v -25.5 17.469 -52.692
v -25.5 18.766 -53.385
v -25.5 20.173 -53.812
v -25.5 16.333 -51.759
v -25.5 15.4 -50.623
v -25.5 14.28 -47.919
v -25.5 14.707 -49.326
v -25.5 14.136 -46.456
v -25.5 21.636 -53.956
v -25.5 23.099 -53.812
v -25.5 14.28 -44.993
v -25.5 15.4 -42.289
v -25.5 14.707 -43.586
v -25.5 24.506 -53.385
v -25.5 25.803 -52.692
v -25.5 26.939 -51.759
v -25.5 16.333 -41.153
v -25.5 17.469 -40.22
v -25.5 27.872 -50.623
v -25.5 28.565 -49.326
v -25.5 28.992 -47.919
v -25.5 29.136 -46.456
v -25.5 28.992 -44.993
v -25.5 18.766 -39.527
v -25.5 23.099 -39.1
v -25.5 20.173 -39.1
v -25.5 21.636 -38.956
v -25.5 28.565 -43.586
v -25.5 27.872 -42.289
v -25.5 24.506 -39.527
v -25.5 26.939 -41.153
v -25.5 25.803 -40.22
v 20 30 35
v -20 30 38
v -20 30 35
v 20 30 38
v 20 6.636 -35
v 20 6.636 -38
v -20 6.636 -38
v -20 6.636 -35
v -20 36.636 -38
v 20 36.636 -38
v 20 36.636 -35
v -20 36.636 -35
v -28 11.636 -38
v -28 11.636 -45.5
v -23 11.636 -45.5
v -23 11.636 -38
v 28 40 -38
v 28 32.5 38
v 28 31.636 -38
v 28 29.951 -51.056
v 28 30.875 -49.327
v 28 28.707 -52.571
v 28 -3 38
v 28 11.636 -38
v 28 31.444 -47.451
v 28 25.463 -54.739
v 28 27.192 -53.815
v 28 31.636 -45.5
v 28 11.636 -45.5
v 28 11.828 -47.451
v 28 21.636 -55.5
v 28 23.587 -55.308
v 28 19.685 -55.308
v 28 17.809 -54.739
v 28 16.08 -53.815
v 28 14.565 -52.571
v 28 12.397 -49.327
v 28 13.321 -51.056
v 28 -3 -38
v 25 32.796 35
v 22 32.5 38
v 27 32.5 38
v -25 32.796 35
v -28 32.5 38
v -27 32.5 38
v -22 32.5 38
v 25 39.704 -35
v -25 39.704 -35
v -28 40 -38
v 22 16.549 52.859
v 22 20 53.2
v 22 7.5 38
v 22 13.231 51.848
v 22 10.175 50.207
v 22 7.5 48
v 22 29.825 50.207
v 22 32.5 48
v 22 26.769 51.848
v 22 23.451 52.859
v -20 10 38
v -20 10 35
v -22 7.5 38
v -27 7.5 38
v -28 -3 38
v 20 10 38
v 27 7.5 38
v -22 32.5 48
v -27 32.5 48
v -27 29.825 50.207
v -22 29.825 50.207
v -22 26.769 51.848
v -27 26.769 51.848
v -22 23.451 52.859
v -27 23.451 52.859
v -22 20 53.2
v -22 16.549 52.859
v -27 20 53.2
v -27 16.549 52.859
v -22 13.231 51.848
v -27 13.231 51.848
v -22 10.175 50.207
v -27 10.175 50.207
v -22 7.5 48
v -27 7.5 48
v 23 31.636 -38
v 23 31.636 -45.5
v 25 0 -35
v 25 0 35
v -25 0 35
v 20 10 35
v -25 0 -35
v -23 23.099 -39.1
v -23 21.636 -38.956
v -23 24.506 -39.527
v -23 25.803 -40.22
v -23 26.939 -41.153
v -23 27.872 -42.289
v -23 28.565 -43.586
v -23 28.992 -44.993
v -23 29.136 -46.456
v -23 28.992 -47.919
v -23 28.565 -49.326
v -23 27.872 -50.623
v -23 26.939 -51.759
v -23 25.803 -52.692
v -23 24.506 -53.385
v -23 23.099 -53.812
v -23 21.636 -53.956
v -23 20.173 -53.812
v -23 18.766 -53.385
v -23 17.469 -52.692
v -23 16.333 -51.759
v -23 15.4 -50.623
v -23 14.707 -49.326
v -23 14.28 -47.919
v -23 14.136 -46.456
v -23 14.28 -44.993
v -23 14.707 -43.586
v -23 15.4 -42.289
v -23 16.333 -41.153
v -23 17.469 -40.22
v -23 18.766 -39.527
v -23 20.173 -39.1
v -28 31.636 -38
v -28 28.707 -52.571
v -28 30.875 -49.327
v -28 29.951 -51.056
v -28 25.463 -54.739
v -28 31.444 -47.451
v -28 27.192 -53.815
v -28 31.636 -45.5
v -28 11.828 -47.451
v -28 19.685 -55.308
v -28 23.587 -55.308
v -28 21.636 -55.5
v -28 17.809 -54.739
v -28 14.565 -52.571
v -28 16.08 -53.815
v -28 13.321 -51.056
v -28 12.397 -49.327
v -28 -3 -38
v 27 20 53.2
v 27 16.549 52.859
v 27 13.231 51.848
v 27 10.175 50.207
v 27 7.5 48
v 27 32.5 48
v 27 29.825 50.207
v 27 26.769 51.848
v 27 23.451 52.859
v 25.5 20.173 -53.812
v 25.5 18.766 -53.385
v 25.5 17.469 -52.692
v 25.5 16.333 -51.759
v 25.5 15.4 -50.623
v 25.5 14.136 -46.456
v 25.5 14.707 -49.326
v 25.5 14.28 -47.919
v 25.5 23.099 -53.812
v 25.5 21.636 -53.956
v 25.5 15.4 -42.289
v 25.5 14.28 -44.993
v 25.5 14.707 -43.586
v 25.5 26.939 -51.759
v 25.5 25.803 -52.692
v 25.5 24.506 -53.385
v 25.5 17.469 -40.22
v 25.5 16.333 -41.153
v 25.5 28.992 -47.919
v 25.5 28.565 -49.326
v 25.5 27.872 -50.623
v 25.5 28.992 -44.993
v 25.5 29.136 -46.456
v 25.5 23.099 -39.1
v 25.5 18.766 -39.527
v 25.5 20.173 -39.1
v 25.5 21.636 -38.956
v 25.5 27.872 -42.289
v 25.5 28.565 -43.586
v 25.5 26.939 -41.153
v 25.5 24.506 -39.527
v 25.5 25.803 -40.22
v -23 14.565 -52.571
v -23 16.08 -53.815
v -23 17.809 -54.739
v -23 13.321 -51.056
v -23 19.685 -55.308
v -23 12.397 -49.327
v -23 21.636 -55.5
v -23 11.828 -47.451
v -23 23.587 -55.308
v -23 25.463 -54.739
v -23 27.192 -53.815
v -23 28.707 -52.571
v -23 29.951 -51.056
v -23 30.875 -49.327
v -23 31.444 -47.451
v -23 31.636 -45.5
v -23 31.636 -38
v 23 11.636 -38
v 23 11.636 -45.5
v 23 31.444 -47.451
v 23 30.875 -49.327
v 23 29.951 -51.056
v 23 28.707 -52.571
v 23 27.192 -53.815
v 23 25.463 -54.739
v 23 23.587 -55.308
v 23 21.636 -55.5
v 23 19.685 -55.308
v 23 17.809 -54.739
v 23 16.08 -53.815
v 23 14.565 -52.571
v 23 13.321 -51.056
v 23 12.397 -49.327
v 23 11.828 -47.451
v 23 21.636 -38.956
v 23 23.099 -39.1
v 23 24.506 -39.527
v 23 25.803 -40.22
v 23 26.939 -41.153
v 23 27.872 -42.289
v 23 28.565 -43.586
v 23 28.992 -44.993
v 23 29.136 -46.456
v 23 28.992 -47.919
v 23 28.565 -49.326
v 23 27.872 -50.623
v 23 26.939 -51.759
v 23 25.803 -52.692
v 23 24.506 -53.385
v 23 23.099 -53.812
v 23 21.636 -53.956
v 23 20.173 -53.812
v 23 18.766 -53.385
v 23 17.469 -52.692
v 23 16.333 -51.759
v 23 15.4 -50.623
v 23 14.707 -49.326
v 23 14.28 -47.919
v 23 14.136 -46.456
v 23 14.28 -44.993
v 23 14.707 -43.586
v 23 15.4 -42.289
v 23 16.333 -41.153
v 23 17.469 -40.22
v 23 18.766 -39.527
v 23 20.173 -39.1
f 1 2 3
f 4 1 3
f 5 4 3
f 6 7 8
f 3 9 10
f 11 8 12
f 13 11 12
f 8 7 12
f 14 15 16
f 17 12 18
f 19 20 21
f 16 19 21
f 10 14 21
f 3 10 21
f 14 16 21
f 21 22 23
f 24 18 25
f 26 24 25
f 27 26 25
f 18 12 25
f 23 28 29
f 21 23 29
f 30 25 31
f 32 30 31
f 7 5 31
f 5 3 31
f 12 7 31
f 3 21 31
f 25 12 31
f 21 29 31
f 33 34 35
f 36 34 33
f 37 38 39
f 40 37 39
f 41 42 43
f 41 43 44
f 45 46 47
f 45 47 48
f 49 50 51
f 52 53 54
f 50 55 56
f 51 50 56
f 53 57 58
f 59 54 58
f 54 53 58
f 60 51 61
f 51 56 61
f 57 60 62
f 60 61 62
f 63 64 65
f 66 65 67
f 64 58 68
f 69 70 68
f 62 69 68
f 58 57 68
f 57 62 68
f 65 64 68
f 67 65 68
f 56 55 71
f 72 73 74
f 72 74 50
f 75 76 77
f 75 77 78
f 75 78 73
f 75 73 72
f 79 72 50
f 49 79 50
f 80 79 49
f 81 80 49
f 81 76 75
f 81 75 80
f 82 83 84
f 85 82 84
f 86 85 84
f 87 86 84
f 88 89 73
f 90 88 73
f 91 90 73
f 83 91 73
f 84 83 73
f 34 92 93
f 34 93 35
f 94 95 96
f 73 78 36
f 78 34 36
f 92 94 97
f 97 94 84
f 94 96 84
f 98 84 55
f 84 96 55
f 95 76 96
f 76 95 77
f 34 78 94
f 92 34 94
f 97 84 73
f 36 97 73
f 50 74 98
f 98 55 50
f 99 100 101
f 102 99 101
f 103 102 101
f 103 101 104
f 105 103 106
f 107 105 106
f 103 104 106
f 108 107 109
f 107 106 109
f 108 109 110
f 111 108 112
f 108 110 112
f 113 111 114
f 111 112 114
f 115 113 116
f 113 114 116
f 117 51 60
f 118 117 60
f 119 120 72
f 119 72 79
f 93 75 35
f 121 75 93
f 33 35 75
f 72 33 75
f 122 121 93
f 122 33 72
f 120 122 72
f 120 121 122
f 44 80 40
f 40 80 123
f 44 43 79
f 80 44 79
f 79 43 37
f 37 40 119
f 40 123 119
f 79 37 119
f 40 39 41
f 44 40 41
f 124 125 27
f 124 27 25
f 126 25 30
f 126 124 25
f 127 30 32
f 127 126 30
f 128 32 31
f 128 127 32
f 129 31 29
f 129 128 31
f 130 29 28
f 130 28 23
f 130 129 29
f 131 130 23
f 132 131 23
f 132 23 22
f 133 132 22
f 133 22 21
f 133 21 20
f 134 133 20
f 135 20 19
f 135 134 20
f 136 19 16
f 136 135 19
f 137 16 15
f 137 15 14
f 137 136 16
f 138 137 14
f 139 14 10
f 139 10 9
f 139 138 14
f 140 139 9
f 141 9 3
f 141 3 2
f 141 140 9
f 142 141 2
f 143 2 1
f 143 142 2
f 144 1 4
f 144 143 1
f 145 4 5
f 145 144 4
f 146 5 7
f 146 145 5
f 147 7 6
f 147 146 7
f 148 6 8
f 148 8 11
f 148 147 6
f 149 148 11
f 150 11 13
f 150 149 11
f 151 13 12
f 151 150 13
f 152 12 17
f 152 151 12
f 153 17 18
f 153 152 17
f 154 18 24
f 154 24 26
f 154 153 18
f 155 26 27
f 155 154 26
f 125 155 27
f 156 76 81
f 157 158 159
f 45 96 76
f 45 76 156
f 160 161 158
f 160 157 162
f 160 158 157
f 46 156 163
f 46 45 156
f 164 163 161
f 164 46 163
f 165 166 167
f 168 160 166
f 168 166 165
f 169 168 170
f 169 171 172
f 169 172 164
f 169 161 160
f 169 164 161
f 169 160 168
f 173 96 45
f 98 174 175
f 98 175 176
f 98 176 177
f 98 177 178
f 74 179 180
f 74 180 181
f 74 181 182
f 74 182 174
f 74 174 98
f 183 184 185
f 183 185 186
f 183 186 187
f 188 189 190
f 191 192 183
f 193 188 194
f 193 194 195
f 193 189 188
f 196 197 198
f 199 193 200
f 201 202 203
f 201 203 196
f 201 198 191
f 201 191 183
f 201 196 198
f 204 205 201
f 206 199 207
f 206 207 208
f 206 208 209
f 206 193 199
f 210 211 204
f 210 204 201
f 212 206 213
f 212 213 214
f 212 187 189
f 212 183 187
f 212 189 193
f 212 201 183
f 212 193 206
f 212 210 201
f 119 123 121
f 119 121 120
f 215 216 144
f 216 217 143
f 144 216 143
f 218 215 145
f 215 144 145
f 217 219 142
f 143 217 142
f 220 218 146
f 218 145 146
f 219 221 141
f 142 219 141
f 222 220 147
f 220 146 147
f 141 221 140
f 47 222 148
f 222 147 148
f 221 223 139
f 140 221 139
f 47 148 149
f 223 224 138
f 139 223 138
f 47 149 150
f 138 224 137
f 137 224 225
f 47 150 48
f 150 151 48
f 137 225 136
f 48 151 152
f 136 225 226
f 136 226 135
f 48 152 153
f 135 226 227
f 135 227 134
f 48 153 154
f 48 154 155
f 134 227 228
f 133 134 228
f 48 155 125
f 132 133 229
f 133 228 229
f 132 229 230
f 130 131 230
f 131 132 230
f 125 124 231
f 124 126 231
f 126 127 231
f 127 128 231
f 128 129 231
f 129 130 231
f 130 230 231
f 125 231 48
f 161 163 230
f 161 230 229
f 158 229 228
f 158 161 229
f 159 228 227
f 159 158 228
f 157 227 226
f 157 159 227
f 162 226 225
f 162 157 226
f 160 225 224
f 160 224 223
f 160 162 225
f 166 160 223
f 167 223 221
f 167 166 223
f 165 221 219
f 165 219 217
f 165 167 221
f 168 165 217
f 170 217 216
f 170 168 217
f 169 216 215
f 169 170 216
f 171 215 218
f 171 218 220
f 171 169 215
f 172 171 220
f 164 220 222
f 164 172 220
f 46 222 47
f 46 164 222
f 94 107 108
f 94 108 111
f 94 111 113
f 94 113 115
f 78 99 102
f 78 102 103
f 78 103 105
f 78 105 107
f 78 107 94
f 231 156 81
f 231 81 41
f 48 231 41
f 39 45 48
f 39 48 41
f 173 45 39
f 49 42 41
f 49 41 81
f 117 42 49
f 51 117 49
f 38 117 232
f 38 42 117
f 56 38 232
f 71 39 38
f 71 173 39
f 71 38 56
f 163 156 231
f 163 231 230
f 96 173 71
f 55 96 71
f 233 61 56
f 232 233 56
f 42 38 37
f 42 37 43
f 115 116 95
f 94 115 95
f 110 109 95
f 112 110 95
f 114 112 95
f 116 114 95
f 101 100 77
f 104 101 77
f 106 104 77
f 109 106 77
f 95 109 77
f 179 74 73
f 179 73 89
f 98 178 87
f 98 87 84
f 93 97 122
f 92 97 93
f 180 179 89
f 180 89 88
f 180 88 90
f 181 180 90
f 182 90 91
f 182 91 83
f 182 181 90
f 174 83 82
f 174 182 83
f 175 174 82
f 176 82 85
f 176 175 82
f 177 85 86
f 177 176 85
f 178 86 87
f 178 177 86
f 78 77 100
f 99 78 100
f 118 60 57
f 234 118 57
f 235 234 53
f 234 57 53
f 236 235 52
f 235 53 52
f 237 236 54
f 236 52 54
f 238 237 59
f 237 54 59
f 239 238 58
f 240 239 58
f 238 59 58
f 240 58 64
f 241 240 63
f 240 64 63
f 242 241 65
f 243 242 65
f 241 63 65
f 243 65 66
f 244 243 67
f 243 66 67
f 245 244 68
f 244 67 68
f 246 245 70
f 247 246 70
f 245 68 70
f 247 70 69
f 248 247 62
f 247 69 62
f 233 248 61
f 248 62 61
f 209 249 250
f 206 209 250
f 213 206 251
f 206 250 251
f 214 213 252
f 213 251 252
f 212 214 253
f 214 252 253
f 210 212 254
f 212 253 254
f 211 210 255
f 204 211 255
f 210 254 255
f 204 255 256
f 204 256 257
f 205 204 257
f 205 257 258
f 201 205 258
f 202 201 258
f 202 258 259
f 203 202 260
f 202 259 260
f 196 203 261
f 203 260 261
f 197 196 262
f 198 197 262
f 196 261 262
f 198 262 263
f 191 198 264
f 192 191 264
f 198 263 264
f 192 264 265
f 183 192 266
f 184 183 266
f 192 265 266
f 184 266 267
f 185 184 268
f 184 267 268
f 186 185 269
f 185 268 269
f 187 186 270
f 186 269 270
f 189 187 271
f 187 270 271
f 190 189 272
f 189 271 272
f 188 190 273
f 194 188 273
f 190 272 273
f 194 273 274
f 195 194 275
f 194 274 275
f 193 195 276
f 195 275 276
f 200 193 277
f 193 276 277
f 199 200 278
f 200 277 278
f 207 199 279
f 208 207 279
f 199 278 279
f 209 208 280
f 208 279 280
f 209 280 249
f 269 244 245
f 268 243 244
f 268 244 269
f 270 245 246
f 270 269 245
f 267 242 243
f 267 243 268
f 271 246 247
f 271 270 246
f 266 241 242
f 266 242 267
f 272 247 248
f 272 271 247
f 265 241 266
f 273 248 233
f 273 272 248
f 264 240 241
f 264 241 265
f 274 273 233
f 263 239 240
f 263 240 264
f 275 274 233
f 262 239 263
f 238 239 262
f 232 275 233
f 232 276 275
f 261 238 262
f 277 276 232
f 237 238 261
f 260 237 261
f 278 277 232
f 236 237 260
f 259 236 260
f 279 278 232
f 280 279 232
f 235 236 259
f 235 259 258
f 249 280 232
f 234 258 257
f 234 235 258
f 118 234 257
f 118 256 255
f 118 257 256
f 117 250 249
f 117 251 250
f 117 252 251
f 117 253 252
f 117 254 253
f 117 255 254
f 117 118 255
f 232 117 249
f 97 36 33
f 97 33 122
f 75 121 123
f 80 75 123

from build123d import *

# Parameters (mm, degrees)
SKETCH1_W           = 50
SKETCH1_H           = 70
BOSS_EXTRUDE1_DEPTH = 40
SHELL1_T            = 3
BOSS_EXTRUDE2_START = -2
BOSS_EXTRUDE2_DEPTH = 5
CUT_EXTRUDE1_DEPTH  = 87.984136485
BOSS_EXTRUDE4_DEPTH = 5
SKETCH8_R           = 7.5
CUT_EXTRUDE2_DEPTH  = 2.5
SKETCH9_W           = 40
SKETCH9_H           = 30
CUT_EXTRUDE3_DEPTH  = 10
CUT_EXTRUDE4_DEPTH  = 10


with BuildPart() as part:
    # Sketch1 → Boss-Extrude1 (new body)
    with BuildSketch(Plane(origin=(0, 0, 0), x_dir=(1, 0, 0), z_dir=(0, 1, 0))):
        Rectangle(SKETCH1_W, SKETCH1_H)
    extrude(amount=BOSS_EXTRUDE1_DEPTH)

    # Shell1
    shell1_openings = [part.faces().sort_by_distance(p)[0] for p in [
        (0, 40, 0),
    ]]
    offset(amount=SHELL1_T, openings=shell1_openings, kind=Kind.INTERSECTION)

    # Sketch2 → Boss-Extrude2 (add)
    with BuildSketch(Plane.ZY.offset(-25).offset(BOSS_EXTRUDE2_START)):
        with BuildLine():
            Line((38, 32.5), (48, 32.5))
            ThreePointArc((48, 32.5), (53.2, 20), (48, 7.5))
            Line((48, 7.5), (38, 7.5))
            Line((38, 7.5), (38, 32.5))
        make_face()
    boss_extrude2 = extrude(amount=BOSS_EXTRUDE2_DEPTH)

    # Mirror1: Boss-Extrude2 across plane
    add(boss_extrude2.mirror(Plane.ZY))

    # Sketch4 → Cut-Extrude1 (cut, through all)
    with BuildSketch(Plane.ZY.offset(28)):
        Polygon((-38, 40), (38, 40), (38, 32.5), align=None)
    extrude(amount=-CUT_EXTRUDE1_DEPTH, mode=Mode.SUBTRACT)

    # Sketch7 → Boss-Extrude4 (add)
    with BuildSketch(Plane.ZY.offset(28)):
        with BuildLine():
            Line((-38, 31.635993136), (-45.5, 31.635993136))
            ThreePointArc((-45.5, 31.635993136), (-55.5, 21.635993136), (-45.5, 11.635993136))
            Line((-45.5, 11.635993136), (-38, 11.635993136))
            Line((-38, 11.635993136), (-38, 31.635993136))
        make_face()
    boss_extrude4 = extrude(amount=-BOSS_EXTRUDE4_DEPTH)

    # Mirror3: Boss-Extrude4 across plane
    add(boss_extrude4.mirror(Plane.ZY))

    # Sketch8 → Cut-Extrude2 (cut)
    with BuildSketch(Plane.ZY.offset(-23)):
        with Locations((-46.455887692, 21.635993136)):
            Circle(SKETCH8_R)
    cut_extrude2 = extrude(amount=-CUT_EXTRUDE2_DEPTH, mode=Mode.SUBTRACT)

    # Mirror4: Cut-Extrude2 across plane
    add(cut_extrude2.mirror(Plane.ZY), mode=Mode.SUBTRACT)

    # Sketch9 → Cut-Extrude3 (cut)
    with BuildSketch(Plane(origin=(0, 0, -38), x_dir=(-1, 0, 0), z_dir=(0, 0, -1))):
        with Locations((0, 21.635993136)):
            Rectangle(SKETCH9_W, SKETCH9_H)
    extrude(amount=-CUT_EXTRUDE3_DEPTH, mode=Mode.SUBTRACT)

    # 3DSketch1 → Cut-Extrude4 (cut)
    with BuildSketch(Plane(origin=(20, 10, 38), x_dir=(-0.894427190999916, 0.447213595499958, 0), z_dir=(0, 0, 1))):
        Polygon((0, 0), (35.77708764, 17.88854382), (44.72135955, 0), (8.94427191, -17.88854382), align=None)
    extrude(amount=-CUT_EXTRUDE4_DEPTH, mode=Mode.SUBTRACT)


solid = part.part
